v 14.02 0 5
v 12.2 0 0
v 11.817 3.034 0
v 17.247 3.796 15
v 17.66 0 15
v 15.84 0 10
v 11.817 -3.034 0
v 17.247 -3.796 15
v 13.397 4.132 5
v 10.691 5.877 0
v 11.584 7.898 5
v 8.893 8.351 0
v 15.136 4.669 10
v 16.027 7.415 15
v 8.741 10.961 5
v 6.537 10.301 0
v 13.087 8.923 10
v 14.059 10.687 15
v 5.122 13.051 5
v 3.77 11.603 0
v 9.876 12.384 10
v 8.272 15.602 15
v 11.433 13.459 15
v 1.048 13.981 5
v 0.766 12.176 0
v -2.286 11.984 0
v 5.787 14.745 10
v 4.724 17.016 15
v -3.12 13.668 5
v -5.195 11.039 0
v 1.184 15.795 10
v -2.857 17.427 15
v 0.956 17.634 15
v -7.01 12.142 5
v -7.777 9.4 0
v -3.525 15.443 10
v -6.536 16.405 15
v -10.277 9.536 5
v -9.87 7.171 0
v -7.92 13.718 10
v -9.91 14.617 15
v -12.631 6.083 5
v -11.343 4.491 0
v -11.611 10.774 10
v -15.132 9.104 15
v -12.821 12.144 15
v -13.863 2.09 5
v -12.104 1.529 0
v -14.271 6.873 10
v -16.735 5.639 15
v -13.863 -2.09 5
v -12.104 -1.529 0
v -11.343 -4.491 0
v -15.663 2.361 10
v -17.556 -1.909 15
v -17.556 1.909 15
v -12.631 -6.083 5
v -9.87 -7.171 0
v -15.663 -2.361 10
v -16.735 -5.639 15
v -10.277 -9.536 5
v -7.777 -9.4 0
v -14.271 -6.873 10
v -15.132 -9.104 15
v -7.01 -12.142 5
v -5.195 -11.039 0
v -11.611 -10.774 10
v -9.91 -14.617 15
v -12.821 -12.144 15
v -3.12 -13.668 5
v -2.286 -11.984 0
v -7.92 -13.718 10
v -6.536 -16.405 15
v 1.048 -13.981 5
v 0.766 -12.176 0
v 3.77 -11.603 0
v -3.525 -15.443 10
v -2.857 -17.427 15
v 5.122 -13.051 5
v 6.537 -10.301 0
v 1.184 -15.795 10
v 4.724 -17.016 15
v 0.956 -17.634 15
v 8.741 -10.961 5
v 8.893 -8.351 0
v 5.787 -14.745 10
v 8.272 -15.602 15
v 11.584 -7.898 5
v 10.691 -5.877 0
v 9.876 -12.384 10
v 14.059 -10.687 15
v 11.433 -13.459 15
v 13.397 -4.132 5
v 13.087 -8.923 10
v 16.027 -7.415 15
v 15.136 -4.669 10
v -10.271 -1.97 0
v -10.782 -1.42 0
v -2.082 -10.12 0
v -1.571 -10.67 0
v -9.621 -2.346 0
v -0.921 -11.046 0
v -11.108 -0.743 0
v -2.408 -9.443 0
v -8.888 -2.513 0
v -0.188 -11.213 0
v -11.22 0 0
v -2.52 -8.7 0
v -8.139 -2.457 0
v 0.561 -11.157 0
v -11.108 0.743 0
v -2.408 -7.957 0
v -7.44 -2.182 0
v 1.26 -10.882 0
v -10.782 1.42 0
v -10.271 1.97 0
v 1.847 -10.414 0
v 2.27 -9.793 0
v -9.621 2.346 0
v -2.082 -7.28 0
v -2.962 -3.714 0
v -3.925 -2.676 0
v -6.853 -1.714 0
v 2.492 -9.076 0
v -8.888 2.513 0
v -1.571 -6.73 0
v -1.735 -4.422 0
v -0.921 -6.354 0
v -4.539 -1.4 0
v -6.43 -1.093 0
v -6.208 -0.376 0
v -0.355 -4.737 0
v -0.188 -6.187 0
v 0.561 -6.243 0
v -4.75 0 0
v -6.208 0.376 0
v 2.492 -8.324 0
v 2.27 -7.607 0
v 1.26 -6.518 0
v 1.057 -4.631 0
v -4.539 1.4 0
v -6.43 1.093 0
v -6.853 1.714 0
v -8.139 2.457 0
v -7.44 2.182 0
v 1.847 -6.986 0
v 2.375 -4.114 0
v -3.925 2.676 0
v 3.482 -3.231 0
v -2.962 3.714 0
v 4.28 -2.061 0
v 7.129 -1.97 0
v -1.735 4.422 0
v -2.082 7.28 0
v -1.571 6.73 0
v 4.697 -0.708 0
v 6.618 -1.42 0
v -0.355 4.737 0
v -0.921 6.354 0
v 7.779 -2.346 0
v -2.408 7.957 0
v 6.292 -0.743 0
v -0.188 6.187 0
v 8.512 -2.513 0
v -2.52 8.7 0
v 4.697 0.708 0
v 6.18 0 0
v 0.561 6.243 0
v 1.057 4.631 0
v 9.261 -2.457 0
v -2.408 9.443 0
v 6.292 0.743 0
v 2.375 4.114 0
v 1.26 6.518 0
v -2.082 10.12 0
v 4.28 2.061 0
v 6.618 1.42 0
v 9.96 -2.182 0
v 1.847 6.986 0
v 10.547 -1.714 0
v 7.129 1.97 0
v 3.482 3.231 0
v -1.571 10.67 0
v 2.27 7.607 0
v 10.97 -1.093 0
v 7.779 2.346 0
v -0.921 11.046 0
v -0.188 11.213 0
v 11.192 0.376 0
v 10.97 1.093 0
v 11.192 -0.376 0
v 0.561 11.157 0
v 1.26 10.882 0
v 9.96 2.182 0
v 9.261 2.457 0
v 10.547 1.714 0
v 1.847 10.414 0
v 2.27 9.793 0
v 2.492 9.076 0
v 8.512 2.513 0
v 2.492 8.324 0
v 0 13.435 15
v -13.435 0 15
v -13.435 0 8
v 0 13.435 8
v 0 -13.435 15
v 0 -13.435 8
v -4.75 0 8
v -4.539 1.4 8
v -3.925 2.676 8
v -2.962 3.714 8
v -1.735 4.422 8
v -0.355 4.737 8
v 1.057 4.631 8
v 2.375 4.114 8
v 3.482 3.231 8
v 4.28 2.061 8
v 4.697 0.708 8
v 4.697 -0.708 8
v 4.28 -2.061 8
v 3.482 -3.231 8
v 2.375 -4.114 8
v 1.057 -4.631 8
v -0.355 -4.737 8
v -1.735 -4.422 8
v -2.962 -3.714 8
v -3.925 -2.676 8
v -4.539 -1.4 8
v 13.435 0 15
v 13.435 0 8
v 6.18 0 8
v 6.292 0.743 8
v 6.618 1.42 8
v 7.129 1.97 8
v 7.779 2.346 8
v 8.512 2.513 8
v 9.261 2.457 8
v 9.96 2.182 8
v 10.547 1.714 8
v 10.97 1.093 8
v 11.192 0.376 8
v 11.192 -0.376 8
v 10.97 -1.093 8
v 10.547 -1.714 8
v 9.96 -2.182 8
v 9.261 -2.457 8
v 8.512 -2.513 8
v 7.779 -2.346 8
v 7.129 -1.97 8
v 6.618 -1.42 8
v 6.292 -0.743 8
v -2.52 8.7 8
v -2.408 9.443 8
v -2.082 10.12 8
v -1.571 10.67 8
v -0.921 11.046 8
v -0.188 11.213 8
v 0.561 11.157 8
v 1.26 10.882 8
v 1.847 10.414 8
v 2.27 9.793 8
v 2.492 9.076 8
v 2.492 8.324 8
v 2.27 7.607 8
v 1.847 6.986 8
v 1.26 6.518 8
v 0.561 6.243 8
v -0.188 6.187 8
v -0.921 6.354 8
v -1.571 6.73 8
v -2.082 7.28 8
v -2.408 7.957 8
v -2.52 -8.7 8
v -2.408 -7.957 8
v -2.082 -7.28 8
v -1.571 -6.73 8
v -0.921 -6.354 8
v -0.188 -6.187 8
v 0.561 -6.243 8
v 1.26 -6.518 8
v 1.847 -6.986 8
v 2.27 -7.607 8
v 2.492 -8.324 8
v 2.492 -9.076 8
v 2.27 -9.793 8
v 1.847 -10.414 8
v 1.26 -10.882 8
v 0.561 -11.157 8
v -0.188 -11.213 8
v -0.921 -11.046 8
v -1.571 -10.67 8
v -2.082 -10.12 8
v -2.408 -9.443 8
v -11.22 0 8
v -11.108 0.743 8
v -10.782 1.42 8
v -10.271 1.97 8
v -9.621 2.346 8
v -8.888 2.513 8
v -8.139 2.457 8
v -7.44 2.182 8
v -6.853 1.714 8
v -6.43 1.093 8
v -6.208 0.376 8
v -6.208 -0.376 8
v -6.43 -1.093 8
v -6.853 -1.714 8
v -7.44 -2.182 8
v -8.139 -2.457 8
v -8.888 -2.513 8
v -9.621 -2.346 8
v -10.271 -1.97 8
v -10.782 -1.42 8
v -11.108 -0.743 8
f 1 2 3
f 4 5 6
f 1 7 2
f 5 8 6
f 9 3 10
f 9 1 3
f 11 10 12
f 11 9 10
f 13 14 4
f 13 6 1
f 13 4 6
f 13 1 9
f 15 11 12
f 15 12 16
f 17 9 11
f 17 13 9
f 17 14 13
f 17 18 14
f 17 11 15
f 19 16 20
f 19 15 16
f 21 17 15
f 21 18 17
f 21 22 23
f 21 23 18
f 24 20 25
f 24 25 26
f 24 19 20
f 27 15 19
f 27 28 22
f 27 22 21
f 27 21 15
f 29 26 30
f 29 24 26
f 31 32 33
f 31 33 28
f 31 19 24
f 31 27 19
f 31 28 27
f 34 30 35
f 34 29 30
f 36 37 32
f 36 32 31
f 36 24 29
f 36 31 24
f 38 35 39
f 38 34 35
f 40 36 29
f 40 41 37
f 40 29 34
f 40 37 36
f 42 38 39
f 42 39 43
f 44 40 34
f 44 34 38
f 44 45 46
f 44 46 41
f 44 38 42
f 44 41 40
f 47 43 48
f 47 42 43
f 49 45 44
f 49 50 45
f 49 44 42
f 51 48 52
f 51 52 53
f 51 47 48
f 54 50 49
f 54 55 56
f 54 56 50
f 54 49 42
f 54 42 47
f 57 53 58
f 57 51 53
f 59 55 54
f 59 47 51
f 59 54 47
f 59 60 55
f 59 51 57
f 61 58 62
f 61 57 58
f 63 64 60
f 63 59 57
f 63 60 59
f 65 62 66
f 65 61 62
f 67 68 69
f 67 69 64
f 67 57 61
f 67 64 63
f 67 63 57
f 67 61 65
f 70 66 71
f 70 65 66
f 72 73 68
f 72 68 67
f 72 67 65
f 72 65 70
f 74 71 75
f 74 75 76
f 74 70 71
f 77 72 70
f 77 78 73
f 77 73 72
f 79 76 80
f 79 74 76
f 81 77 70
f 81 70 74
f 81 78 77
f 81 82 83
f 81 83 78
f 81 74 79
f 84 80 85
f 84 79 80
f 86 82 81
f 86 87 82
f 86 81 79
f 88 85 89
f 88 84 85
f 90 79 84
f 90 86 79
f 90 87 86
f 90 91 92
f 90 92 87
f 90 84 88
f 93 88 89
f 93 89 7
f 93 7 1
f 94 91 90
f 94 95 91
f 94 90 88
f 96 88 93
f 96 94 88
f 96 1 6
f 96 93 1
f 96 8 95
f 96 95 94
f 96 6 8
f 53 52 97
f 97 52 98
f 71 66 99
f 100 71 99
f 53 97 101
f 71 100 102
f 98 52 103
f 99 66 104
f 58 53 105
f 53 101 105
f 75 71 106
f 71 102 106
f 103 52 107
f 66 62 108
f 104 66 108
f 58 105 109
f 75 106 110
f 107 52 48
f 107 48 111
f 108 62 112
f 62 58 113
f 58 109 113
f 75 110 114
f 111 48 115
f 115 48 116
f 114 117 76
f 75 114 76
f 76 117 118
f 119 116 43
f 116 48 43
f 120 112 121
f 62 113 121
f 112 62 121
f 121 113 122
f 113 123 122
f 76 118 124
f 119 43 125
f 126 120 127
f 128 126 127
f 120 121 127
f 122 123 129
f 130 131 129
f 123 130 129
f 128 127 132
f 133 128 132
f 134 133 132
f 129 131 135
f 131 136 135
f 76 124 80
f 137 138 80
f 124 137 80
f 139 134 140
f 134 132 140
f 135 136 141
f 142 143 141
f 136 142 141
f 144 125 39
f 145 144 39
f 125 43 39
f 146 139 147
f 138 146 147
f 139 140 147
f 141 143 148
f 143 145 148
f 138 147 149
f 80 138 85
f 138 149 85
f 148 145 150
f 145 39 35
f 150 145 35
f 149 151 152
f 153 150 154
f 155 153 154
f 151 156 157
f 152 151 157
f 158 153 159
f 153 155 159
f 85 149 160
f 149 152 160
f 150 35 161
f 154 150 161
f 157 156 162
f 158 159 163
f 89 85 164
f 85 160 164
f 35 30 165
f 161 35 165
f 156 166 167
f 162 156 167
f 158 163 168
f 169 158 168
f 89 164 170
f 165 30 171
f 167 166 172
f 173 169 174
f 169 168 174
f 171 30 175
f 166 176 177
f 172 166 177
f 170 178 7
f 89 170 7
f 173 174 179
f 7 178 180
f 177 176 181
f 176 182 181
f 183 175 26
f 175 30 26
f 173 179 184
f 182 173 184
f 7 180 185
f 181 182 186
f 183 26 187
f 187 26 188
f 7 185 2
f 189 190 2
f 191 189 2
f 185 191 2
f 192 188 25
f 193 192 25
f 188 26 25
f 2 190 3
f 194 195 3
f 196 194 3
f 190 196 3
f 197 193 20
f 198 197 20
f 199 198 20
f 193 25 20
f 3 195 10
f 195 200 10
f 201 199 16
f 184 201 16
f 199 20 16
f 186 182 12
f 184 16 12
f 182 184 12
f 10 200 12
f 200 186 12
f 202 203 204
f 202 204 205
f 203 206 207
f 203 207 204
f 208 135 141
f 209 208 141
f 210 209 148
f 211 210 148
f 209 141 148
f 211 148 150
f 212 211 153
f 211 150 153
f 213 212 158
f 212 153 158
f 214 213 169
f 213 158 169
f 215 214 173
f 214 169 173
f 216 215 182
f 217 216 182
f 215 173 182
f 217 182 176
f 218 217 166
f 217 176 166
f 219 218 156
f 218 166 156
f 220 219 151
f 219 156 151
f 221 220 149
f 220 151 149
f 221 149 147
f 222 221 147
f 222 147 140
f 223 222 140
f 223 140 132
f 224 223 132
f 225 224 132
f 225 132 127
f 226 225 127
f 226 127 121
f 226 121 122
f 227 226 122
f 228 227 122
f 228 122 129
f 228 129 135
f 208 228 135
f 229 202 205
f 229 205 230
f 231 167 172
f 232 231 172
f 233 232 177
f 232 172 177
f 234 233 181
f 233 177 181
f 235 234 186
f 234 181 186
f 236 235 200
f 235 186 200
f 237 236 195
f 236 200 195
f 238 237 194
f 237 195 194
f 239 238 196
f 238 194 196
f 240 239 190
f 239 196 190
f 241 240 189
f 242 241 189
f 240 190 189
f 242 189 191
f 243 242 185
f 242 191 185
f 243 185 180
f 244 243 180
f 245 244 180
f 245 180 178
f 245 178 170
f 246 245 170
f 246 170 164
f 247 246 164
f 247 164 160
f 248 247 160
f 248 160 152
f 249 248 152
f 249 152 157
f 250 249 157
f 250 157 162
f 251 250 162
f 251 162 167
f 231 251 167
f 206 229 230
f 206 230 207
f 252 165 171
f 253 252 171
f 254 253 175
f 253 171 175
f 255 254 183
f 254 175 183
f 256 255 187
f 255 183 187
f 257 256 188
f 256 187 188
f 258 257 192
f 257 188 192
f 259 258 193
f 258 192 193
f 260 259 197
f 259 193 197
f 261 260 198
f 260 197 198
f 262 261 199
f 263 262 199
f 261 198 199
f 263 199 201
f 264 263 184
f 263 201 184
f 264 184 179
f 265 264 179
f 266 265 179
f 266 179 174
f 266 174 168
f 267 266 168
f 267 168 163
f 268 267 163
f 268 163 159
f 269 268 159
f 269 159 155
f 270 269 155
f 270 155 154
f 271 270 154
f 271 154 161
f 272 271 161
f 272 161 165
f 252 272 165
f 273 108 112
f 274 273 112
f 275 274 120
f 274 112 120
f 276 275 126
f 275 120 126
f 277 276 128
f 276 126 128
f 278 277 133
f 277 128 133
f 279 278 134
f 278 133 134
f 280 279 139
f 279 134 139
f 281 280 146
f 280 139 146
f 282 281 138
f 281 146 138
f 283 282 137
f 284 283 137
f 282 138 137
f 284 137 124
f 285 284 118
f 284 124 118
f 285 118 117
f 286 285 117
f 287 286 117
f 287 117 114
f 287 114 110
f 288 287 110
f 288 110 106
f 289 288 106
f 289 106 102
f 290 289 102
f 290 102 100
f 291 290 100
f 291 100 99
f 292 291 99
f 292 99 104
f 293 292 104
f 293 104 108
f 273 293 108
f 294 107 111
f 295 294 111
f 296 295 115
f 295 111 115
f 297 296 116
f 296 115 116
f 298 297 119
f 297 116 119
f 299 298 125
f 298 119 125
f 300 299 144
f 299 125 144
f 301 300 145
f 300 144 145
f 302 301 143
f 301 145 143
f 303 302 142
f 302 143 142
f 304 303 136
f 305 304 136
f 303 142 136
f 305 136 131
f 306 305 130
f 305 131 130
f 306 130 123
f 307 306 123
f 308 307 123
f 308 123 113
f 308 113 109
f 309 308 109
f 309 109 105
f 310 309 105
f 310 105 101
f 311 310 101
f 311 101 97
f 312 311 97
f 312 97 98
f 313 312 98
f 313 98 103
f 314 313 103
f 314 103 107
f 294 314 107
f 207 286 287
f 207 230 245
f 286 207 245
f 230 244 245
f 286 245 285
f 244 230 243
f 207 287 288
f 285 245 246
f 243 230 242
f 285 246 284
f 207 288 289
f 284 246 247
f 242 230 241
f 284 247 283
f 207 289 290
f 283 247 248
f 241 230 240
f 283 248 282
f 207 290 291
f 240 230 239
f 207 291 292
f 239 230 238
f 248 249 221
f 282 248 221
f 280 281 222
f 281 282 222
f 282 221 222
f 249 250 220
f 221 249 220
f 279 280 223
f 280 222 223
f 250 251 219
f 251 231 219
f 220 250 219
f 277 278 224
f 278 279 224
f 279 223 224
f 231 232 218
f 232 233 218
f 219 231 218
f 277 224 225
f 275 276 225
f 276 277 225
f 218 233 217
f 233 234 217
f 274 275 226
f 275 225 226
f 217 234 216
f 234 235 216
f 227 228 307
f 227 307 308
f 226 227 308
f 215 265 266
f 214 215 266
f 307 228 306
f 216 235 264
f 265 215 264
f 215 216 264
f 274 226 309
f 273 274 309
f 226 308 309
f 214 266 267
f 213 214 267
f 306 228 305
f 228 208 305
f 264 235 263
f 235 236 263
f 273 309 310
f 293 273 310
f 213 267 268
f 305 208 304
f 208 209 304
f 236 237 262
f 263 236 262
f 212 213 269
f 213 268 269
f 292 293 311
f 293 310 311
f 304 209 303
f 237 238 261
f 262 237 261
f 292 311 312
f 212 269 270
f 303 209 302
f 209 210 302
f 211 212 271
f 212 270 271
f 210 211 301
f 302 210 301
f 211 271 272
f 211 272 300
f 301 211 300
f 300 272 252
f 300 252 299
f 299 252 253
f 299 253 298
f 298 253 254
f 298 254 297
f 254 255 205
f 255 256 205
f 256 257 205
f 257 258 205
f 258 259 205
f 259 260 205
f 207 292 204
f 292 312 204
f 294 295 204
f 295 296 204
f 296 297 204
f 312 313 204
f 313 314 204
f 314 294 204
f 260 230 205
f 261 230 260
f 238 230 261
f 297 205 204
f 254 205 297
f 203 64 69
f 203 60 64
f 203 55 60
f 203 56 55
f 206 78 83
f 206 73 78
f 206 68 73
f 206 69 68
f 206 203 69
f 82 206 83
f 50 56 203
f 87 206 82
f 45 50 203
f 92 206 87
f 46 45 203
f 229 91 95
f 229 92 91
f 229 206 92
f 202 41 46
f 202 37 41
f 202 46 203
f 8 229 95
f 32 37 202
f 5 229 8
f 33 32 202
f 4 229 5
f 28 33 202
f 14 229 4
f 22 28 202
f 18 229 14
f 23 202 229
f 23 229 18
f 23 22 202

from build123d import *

# Parameters (mm, degrees)
GEARFACEPROFILE_R           = 12.2
GEARFACEEXTRUDE_DEPTH       = 15
GEARFACEEXTRUDE_TAPER       = -20
CENTERHOLEPROFILE_R         = 4.75
CENTERHOLECUT_DEPTH         = 16.0000001
SCREWHOLEPROFILE_R          = 2.52
SCREWHOLECUT_DEPTH          = 16.0000001
SHAFTCOLLARDOCKINGCUT_DEPTH = 7


with BuildPart() as part:
    # GearFaceProfile → GearFaceExtrude (new body)
    with BuildSketch(Plane.XY):
        Circle(GEARFACEPROFILE_R)
    extrude(amount=GEARFACEEXTRUDE_DEPTH, taper=GEARFACEEXTRUDE_TAPER)

    # CenterHoleProfile → CenterHoleCut (cut, through all)
    with BuildSketch(Plane(origin=(0, 0, 0), x_dir=(-1, 0, 0), z_dir=(0, 0, -1))):
        Circle(CENTERHOLEPROFILE_R)
    extrude(amount=-CENTERHOLECUT_DEPTH, mode=Mode.SUBTRACT)

    # ScrewHoleProfile → ScrewHoleCut (cut, through all)
    with BuildSketch(Plane(origin=(0, 0, 0), x_dir=(-1, 0, 0), z_dir=(0, 0, -1))):
        with Locations((0, 8.7)):
            Circle(SCREWHOLEPROFILE_R)
        with Locations((8.7, 0)):
            Circle(SCREWHOLEPROFILE_R)
        with Locations((0, -8.7)):
            Circle(SCREWHOLEPROFILE_R)
        with Locations((-8.7, 0)):
            Circle(SCREWHOLEPROFILE_R)
    extrude(amount=-SCREWHOLECUT_DEPTH, mode=Mode.SUBTRACT)

    # ShaftCollarAttachmentProfile → ShaftCollarDockingCut (cut)
    with BuildSketch(Plane.XY.offset(15)):
        Polygon((0, 13.435028843), (13.435028843, 0), (0, -13.435028843), (-13.435028843, 0), align=None)
    extrude(amount=-SHAFTCOLLARDOCKINGCUT_DEPTH, mode=Mode.SUBTRACT)


solid = part.part
